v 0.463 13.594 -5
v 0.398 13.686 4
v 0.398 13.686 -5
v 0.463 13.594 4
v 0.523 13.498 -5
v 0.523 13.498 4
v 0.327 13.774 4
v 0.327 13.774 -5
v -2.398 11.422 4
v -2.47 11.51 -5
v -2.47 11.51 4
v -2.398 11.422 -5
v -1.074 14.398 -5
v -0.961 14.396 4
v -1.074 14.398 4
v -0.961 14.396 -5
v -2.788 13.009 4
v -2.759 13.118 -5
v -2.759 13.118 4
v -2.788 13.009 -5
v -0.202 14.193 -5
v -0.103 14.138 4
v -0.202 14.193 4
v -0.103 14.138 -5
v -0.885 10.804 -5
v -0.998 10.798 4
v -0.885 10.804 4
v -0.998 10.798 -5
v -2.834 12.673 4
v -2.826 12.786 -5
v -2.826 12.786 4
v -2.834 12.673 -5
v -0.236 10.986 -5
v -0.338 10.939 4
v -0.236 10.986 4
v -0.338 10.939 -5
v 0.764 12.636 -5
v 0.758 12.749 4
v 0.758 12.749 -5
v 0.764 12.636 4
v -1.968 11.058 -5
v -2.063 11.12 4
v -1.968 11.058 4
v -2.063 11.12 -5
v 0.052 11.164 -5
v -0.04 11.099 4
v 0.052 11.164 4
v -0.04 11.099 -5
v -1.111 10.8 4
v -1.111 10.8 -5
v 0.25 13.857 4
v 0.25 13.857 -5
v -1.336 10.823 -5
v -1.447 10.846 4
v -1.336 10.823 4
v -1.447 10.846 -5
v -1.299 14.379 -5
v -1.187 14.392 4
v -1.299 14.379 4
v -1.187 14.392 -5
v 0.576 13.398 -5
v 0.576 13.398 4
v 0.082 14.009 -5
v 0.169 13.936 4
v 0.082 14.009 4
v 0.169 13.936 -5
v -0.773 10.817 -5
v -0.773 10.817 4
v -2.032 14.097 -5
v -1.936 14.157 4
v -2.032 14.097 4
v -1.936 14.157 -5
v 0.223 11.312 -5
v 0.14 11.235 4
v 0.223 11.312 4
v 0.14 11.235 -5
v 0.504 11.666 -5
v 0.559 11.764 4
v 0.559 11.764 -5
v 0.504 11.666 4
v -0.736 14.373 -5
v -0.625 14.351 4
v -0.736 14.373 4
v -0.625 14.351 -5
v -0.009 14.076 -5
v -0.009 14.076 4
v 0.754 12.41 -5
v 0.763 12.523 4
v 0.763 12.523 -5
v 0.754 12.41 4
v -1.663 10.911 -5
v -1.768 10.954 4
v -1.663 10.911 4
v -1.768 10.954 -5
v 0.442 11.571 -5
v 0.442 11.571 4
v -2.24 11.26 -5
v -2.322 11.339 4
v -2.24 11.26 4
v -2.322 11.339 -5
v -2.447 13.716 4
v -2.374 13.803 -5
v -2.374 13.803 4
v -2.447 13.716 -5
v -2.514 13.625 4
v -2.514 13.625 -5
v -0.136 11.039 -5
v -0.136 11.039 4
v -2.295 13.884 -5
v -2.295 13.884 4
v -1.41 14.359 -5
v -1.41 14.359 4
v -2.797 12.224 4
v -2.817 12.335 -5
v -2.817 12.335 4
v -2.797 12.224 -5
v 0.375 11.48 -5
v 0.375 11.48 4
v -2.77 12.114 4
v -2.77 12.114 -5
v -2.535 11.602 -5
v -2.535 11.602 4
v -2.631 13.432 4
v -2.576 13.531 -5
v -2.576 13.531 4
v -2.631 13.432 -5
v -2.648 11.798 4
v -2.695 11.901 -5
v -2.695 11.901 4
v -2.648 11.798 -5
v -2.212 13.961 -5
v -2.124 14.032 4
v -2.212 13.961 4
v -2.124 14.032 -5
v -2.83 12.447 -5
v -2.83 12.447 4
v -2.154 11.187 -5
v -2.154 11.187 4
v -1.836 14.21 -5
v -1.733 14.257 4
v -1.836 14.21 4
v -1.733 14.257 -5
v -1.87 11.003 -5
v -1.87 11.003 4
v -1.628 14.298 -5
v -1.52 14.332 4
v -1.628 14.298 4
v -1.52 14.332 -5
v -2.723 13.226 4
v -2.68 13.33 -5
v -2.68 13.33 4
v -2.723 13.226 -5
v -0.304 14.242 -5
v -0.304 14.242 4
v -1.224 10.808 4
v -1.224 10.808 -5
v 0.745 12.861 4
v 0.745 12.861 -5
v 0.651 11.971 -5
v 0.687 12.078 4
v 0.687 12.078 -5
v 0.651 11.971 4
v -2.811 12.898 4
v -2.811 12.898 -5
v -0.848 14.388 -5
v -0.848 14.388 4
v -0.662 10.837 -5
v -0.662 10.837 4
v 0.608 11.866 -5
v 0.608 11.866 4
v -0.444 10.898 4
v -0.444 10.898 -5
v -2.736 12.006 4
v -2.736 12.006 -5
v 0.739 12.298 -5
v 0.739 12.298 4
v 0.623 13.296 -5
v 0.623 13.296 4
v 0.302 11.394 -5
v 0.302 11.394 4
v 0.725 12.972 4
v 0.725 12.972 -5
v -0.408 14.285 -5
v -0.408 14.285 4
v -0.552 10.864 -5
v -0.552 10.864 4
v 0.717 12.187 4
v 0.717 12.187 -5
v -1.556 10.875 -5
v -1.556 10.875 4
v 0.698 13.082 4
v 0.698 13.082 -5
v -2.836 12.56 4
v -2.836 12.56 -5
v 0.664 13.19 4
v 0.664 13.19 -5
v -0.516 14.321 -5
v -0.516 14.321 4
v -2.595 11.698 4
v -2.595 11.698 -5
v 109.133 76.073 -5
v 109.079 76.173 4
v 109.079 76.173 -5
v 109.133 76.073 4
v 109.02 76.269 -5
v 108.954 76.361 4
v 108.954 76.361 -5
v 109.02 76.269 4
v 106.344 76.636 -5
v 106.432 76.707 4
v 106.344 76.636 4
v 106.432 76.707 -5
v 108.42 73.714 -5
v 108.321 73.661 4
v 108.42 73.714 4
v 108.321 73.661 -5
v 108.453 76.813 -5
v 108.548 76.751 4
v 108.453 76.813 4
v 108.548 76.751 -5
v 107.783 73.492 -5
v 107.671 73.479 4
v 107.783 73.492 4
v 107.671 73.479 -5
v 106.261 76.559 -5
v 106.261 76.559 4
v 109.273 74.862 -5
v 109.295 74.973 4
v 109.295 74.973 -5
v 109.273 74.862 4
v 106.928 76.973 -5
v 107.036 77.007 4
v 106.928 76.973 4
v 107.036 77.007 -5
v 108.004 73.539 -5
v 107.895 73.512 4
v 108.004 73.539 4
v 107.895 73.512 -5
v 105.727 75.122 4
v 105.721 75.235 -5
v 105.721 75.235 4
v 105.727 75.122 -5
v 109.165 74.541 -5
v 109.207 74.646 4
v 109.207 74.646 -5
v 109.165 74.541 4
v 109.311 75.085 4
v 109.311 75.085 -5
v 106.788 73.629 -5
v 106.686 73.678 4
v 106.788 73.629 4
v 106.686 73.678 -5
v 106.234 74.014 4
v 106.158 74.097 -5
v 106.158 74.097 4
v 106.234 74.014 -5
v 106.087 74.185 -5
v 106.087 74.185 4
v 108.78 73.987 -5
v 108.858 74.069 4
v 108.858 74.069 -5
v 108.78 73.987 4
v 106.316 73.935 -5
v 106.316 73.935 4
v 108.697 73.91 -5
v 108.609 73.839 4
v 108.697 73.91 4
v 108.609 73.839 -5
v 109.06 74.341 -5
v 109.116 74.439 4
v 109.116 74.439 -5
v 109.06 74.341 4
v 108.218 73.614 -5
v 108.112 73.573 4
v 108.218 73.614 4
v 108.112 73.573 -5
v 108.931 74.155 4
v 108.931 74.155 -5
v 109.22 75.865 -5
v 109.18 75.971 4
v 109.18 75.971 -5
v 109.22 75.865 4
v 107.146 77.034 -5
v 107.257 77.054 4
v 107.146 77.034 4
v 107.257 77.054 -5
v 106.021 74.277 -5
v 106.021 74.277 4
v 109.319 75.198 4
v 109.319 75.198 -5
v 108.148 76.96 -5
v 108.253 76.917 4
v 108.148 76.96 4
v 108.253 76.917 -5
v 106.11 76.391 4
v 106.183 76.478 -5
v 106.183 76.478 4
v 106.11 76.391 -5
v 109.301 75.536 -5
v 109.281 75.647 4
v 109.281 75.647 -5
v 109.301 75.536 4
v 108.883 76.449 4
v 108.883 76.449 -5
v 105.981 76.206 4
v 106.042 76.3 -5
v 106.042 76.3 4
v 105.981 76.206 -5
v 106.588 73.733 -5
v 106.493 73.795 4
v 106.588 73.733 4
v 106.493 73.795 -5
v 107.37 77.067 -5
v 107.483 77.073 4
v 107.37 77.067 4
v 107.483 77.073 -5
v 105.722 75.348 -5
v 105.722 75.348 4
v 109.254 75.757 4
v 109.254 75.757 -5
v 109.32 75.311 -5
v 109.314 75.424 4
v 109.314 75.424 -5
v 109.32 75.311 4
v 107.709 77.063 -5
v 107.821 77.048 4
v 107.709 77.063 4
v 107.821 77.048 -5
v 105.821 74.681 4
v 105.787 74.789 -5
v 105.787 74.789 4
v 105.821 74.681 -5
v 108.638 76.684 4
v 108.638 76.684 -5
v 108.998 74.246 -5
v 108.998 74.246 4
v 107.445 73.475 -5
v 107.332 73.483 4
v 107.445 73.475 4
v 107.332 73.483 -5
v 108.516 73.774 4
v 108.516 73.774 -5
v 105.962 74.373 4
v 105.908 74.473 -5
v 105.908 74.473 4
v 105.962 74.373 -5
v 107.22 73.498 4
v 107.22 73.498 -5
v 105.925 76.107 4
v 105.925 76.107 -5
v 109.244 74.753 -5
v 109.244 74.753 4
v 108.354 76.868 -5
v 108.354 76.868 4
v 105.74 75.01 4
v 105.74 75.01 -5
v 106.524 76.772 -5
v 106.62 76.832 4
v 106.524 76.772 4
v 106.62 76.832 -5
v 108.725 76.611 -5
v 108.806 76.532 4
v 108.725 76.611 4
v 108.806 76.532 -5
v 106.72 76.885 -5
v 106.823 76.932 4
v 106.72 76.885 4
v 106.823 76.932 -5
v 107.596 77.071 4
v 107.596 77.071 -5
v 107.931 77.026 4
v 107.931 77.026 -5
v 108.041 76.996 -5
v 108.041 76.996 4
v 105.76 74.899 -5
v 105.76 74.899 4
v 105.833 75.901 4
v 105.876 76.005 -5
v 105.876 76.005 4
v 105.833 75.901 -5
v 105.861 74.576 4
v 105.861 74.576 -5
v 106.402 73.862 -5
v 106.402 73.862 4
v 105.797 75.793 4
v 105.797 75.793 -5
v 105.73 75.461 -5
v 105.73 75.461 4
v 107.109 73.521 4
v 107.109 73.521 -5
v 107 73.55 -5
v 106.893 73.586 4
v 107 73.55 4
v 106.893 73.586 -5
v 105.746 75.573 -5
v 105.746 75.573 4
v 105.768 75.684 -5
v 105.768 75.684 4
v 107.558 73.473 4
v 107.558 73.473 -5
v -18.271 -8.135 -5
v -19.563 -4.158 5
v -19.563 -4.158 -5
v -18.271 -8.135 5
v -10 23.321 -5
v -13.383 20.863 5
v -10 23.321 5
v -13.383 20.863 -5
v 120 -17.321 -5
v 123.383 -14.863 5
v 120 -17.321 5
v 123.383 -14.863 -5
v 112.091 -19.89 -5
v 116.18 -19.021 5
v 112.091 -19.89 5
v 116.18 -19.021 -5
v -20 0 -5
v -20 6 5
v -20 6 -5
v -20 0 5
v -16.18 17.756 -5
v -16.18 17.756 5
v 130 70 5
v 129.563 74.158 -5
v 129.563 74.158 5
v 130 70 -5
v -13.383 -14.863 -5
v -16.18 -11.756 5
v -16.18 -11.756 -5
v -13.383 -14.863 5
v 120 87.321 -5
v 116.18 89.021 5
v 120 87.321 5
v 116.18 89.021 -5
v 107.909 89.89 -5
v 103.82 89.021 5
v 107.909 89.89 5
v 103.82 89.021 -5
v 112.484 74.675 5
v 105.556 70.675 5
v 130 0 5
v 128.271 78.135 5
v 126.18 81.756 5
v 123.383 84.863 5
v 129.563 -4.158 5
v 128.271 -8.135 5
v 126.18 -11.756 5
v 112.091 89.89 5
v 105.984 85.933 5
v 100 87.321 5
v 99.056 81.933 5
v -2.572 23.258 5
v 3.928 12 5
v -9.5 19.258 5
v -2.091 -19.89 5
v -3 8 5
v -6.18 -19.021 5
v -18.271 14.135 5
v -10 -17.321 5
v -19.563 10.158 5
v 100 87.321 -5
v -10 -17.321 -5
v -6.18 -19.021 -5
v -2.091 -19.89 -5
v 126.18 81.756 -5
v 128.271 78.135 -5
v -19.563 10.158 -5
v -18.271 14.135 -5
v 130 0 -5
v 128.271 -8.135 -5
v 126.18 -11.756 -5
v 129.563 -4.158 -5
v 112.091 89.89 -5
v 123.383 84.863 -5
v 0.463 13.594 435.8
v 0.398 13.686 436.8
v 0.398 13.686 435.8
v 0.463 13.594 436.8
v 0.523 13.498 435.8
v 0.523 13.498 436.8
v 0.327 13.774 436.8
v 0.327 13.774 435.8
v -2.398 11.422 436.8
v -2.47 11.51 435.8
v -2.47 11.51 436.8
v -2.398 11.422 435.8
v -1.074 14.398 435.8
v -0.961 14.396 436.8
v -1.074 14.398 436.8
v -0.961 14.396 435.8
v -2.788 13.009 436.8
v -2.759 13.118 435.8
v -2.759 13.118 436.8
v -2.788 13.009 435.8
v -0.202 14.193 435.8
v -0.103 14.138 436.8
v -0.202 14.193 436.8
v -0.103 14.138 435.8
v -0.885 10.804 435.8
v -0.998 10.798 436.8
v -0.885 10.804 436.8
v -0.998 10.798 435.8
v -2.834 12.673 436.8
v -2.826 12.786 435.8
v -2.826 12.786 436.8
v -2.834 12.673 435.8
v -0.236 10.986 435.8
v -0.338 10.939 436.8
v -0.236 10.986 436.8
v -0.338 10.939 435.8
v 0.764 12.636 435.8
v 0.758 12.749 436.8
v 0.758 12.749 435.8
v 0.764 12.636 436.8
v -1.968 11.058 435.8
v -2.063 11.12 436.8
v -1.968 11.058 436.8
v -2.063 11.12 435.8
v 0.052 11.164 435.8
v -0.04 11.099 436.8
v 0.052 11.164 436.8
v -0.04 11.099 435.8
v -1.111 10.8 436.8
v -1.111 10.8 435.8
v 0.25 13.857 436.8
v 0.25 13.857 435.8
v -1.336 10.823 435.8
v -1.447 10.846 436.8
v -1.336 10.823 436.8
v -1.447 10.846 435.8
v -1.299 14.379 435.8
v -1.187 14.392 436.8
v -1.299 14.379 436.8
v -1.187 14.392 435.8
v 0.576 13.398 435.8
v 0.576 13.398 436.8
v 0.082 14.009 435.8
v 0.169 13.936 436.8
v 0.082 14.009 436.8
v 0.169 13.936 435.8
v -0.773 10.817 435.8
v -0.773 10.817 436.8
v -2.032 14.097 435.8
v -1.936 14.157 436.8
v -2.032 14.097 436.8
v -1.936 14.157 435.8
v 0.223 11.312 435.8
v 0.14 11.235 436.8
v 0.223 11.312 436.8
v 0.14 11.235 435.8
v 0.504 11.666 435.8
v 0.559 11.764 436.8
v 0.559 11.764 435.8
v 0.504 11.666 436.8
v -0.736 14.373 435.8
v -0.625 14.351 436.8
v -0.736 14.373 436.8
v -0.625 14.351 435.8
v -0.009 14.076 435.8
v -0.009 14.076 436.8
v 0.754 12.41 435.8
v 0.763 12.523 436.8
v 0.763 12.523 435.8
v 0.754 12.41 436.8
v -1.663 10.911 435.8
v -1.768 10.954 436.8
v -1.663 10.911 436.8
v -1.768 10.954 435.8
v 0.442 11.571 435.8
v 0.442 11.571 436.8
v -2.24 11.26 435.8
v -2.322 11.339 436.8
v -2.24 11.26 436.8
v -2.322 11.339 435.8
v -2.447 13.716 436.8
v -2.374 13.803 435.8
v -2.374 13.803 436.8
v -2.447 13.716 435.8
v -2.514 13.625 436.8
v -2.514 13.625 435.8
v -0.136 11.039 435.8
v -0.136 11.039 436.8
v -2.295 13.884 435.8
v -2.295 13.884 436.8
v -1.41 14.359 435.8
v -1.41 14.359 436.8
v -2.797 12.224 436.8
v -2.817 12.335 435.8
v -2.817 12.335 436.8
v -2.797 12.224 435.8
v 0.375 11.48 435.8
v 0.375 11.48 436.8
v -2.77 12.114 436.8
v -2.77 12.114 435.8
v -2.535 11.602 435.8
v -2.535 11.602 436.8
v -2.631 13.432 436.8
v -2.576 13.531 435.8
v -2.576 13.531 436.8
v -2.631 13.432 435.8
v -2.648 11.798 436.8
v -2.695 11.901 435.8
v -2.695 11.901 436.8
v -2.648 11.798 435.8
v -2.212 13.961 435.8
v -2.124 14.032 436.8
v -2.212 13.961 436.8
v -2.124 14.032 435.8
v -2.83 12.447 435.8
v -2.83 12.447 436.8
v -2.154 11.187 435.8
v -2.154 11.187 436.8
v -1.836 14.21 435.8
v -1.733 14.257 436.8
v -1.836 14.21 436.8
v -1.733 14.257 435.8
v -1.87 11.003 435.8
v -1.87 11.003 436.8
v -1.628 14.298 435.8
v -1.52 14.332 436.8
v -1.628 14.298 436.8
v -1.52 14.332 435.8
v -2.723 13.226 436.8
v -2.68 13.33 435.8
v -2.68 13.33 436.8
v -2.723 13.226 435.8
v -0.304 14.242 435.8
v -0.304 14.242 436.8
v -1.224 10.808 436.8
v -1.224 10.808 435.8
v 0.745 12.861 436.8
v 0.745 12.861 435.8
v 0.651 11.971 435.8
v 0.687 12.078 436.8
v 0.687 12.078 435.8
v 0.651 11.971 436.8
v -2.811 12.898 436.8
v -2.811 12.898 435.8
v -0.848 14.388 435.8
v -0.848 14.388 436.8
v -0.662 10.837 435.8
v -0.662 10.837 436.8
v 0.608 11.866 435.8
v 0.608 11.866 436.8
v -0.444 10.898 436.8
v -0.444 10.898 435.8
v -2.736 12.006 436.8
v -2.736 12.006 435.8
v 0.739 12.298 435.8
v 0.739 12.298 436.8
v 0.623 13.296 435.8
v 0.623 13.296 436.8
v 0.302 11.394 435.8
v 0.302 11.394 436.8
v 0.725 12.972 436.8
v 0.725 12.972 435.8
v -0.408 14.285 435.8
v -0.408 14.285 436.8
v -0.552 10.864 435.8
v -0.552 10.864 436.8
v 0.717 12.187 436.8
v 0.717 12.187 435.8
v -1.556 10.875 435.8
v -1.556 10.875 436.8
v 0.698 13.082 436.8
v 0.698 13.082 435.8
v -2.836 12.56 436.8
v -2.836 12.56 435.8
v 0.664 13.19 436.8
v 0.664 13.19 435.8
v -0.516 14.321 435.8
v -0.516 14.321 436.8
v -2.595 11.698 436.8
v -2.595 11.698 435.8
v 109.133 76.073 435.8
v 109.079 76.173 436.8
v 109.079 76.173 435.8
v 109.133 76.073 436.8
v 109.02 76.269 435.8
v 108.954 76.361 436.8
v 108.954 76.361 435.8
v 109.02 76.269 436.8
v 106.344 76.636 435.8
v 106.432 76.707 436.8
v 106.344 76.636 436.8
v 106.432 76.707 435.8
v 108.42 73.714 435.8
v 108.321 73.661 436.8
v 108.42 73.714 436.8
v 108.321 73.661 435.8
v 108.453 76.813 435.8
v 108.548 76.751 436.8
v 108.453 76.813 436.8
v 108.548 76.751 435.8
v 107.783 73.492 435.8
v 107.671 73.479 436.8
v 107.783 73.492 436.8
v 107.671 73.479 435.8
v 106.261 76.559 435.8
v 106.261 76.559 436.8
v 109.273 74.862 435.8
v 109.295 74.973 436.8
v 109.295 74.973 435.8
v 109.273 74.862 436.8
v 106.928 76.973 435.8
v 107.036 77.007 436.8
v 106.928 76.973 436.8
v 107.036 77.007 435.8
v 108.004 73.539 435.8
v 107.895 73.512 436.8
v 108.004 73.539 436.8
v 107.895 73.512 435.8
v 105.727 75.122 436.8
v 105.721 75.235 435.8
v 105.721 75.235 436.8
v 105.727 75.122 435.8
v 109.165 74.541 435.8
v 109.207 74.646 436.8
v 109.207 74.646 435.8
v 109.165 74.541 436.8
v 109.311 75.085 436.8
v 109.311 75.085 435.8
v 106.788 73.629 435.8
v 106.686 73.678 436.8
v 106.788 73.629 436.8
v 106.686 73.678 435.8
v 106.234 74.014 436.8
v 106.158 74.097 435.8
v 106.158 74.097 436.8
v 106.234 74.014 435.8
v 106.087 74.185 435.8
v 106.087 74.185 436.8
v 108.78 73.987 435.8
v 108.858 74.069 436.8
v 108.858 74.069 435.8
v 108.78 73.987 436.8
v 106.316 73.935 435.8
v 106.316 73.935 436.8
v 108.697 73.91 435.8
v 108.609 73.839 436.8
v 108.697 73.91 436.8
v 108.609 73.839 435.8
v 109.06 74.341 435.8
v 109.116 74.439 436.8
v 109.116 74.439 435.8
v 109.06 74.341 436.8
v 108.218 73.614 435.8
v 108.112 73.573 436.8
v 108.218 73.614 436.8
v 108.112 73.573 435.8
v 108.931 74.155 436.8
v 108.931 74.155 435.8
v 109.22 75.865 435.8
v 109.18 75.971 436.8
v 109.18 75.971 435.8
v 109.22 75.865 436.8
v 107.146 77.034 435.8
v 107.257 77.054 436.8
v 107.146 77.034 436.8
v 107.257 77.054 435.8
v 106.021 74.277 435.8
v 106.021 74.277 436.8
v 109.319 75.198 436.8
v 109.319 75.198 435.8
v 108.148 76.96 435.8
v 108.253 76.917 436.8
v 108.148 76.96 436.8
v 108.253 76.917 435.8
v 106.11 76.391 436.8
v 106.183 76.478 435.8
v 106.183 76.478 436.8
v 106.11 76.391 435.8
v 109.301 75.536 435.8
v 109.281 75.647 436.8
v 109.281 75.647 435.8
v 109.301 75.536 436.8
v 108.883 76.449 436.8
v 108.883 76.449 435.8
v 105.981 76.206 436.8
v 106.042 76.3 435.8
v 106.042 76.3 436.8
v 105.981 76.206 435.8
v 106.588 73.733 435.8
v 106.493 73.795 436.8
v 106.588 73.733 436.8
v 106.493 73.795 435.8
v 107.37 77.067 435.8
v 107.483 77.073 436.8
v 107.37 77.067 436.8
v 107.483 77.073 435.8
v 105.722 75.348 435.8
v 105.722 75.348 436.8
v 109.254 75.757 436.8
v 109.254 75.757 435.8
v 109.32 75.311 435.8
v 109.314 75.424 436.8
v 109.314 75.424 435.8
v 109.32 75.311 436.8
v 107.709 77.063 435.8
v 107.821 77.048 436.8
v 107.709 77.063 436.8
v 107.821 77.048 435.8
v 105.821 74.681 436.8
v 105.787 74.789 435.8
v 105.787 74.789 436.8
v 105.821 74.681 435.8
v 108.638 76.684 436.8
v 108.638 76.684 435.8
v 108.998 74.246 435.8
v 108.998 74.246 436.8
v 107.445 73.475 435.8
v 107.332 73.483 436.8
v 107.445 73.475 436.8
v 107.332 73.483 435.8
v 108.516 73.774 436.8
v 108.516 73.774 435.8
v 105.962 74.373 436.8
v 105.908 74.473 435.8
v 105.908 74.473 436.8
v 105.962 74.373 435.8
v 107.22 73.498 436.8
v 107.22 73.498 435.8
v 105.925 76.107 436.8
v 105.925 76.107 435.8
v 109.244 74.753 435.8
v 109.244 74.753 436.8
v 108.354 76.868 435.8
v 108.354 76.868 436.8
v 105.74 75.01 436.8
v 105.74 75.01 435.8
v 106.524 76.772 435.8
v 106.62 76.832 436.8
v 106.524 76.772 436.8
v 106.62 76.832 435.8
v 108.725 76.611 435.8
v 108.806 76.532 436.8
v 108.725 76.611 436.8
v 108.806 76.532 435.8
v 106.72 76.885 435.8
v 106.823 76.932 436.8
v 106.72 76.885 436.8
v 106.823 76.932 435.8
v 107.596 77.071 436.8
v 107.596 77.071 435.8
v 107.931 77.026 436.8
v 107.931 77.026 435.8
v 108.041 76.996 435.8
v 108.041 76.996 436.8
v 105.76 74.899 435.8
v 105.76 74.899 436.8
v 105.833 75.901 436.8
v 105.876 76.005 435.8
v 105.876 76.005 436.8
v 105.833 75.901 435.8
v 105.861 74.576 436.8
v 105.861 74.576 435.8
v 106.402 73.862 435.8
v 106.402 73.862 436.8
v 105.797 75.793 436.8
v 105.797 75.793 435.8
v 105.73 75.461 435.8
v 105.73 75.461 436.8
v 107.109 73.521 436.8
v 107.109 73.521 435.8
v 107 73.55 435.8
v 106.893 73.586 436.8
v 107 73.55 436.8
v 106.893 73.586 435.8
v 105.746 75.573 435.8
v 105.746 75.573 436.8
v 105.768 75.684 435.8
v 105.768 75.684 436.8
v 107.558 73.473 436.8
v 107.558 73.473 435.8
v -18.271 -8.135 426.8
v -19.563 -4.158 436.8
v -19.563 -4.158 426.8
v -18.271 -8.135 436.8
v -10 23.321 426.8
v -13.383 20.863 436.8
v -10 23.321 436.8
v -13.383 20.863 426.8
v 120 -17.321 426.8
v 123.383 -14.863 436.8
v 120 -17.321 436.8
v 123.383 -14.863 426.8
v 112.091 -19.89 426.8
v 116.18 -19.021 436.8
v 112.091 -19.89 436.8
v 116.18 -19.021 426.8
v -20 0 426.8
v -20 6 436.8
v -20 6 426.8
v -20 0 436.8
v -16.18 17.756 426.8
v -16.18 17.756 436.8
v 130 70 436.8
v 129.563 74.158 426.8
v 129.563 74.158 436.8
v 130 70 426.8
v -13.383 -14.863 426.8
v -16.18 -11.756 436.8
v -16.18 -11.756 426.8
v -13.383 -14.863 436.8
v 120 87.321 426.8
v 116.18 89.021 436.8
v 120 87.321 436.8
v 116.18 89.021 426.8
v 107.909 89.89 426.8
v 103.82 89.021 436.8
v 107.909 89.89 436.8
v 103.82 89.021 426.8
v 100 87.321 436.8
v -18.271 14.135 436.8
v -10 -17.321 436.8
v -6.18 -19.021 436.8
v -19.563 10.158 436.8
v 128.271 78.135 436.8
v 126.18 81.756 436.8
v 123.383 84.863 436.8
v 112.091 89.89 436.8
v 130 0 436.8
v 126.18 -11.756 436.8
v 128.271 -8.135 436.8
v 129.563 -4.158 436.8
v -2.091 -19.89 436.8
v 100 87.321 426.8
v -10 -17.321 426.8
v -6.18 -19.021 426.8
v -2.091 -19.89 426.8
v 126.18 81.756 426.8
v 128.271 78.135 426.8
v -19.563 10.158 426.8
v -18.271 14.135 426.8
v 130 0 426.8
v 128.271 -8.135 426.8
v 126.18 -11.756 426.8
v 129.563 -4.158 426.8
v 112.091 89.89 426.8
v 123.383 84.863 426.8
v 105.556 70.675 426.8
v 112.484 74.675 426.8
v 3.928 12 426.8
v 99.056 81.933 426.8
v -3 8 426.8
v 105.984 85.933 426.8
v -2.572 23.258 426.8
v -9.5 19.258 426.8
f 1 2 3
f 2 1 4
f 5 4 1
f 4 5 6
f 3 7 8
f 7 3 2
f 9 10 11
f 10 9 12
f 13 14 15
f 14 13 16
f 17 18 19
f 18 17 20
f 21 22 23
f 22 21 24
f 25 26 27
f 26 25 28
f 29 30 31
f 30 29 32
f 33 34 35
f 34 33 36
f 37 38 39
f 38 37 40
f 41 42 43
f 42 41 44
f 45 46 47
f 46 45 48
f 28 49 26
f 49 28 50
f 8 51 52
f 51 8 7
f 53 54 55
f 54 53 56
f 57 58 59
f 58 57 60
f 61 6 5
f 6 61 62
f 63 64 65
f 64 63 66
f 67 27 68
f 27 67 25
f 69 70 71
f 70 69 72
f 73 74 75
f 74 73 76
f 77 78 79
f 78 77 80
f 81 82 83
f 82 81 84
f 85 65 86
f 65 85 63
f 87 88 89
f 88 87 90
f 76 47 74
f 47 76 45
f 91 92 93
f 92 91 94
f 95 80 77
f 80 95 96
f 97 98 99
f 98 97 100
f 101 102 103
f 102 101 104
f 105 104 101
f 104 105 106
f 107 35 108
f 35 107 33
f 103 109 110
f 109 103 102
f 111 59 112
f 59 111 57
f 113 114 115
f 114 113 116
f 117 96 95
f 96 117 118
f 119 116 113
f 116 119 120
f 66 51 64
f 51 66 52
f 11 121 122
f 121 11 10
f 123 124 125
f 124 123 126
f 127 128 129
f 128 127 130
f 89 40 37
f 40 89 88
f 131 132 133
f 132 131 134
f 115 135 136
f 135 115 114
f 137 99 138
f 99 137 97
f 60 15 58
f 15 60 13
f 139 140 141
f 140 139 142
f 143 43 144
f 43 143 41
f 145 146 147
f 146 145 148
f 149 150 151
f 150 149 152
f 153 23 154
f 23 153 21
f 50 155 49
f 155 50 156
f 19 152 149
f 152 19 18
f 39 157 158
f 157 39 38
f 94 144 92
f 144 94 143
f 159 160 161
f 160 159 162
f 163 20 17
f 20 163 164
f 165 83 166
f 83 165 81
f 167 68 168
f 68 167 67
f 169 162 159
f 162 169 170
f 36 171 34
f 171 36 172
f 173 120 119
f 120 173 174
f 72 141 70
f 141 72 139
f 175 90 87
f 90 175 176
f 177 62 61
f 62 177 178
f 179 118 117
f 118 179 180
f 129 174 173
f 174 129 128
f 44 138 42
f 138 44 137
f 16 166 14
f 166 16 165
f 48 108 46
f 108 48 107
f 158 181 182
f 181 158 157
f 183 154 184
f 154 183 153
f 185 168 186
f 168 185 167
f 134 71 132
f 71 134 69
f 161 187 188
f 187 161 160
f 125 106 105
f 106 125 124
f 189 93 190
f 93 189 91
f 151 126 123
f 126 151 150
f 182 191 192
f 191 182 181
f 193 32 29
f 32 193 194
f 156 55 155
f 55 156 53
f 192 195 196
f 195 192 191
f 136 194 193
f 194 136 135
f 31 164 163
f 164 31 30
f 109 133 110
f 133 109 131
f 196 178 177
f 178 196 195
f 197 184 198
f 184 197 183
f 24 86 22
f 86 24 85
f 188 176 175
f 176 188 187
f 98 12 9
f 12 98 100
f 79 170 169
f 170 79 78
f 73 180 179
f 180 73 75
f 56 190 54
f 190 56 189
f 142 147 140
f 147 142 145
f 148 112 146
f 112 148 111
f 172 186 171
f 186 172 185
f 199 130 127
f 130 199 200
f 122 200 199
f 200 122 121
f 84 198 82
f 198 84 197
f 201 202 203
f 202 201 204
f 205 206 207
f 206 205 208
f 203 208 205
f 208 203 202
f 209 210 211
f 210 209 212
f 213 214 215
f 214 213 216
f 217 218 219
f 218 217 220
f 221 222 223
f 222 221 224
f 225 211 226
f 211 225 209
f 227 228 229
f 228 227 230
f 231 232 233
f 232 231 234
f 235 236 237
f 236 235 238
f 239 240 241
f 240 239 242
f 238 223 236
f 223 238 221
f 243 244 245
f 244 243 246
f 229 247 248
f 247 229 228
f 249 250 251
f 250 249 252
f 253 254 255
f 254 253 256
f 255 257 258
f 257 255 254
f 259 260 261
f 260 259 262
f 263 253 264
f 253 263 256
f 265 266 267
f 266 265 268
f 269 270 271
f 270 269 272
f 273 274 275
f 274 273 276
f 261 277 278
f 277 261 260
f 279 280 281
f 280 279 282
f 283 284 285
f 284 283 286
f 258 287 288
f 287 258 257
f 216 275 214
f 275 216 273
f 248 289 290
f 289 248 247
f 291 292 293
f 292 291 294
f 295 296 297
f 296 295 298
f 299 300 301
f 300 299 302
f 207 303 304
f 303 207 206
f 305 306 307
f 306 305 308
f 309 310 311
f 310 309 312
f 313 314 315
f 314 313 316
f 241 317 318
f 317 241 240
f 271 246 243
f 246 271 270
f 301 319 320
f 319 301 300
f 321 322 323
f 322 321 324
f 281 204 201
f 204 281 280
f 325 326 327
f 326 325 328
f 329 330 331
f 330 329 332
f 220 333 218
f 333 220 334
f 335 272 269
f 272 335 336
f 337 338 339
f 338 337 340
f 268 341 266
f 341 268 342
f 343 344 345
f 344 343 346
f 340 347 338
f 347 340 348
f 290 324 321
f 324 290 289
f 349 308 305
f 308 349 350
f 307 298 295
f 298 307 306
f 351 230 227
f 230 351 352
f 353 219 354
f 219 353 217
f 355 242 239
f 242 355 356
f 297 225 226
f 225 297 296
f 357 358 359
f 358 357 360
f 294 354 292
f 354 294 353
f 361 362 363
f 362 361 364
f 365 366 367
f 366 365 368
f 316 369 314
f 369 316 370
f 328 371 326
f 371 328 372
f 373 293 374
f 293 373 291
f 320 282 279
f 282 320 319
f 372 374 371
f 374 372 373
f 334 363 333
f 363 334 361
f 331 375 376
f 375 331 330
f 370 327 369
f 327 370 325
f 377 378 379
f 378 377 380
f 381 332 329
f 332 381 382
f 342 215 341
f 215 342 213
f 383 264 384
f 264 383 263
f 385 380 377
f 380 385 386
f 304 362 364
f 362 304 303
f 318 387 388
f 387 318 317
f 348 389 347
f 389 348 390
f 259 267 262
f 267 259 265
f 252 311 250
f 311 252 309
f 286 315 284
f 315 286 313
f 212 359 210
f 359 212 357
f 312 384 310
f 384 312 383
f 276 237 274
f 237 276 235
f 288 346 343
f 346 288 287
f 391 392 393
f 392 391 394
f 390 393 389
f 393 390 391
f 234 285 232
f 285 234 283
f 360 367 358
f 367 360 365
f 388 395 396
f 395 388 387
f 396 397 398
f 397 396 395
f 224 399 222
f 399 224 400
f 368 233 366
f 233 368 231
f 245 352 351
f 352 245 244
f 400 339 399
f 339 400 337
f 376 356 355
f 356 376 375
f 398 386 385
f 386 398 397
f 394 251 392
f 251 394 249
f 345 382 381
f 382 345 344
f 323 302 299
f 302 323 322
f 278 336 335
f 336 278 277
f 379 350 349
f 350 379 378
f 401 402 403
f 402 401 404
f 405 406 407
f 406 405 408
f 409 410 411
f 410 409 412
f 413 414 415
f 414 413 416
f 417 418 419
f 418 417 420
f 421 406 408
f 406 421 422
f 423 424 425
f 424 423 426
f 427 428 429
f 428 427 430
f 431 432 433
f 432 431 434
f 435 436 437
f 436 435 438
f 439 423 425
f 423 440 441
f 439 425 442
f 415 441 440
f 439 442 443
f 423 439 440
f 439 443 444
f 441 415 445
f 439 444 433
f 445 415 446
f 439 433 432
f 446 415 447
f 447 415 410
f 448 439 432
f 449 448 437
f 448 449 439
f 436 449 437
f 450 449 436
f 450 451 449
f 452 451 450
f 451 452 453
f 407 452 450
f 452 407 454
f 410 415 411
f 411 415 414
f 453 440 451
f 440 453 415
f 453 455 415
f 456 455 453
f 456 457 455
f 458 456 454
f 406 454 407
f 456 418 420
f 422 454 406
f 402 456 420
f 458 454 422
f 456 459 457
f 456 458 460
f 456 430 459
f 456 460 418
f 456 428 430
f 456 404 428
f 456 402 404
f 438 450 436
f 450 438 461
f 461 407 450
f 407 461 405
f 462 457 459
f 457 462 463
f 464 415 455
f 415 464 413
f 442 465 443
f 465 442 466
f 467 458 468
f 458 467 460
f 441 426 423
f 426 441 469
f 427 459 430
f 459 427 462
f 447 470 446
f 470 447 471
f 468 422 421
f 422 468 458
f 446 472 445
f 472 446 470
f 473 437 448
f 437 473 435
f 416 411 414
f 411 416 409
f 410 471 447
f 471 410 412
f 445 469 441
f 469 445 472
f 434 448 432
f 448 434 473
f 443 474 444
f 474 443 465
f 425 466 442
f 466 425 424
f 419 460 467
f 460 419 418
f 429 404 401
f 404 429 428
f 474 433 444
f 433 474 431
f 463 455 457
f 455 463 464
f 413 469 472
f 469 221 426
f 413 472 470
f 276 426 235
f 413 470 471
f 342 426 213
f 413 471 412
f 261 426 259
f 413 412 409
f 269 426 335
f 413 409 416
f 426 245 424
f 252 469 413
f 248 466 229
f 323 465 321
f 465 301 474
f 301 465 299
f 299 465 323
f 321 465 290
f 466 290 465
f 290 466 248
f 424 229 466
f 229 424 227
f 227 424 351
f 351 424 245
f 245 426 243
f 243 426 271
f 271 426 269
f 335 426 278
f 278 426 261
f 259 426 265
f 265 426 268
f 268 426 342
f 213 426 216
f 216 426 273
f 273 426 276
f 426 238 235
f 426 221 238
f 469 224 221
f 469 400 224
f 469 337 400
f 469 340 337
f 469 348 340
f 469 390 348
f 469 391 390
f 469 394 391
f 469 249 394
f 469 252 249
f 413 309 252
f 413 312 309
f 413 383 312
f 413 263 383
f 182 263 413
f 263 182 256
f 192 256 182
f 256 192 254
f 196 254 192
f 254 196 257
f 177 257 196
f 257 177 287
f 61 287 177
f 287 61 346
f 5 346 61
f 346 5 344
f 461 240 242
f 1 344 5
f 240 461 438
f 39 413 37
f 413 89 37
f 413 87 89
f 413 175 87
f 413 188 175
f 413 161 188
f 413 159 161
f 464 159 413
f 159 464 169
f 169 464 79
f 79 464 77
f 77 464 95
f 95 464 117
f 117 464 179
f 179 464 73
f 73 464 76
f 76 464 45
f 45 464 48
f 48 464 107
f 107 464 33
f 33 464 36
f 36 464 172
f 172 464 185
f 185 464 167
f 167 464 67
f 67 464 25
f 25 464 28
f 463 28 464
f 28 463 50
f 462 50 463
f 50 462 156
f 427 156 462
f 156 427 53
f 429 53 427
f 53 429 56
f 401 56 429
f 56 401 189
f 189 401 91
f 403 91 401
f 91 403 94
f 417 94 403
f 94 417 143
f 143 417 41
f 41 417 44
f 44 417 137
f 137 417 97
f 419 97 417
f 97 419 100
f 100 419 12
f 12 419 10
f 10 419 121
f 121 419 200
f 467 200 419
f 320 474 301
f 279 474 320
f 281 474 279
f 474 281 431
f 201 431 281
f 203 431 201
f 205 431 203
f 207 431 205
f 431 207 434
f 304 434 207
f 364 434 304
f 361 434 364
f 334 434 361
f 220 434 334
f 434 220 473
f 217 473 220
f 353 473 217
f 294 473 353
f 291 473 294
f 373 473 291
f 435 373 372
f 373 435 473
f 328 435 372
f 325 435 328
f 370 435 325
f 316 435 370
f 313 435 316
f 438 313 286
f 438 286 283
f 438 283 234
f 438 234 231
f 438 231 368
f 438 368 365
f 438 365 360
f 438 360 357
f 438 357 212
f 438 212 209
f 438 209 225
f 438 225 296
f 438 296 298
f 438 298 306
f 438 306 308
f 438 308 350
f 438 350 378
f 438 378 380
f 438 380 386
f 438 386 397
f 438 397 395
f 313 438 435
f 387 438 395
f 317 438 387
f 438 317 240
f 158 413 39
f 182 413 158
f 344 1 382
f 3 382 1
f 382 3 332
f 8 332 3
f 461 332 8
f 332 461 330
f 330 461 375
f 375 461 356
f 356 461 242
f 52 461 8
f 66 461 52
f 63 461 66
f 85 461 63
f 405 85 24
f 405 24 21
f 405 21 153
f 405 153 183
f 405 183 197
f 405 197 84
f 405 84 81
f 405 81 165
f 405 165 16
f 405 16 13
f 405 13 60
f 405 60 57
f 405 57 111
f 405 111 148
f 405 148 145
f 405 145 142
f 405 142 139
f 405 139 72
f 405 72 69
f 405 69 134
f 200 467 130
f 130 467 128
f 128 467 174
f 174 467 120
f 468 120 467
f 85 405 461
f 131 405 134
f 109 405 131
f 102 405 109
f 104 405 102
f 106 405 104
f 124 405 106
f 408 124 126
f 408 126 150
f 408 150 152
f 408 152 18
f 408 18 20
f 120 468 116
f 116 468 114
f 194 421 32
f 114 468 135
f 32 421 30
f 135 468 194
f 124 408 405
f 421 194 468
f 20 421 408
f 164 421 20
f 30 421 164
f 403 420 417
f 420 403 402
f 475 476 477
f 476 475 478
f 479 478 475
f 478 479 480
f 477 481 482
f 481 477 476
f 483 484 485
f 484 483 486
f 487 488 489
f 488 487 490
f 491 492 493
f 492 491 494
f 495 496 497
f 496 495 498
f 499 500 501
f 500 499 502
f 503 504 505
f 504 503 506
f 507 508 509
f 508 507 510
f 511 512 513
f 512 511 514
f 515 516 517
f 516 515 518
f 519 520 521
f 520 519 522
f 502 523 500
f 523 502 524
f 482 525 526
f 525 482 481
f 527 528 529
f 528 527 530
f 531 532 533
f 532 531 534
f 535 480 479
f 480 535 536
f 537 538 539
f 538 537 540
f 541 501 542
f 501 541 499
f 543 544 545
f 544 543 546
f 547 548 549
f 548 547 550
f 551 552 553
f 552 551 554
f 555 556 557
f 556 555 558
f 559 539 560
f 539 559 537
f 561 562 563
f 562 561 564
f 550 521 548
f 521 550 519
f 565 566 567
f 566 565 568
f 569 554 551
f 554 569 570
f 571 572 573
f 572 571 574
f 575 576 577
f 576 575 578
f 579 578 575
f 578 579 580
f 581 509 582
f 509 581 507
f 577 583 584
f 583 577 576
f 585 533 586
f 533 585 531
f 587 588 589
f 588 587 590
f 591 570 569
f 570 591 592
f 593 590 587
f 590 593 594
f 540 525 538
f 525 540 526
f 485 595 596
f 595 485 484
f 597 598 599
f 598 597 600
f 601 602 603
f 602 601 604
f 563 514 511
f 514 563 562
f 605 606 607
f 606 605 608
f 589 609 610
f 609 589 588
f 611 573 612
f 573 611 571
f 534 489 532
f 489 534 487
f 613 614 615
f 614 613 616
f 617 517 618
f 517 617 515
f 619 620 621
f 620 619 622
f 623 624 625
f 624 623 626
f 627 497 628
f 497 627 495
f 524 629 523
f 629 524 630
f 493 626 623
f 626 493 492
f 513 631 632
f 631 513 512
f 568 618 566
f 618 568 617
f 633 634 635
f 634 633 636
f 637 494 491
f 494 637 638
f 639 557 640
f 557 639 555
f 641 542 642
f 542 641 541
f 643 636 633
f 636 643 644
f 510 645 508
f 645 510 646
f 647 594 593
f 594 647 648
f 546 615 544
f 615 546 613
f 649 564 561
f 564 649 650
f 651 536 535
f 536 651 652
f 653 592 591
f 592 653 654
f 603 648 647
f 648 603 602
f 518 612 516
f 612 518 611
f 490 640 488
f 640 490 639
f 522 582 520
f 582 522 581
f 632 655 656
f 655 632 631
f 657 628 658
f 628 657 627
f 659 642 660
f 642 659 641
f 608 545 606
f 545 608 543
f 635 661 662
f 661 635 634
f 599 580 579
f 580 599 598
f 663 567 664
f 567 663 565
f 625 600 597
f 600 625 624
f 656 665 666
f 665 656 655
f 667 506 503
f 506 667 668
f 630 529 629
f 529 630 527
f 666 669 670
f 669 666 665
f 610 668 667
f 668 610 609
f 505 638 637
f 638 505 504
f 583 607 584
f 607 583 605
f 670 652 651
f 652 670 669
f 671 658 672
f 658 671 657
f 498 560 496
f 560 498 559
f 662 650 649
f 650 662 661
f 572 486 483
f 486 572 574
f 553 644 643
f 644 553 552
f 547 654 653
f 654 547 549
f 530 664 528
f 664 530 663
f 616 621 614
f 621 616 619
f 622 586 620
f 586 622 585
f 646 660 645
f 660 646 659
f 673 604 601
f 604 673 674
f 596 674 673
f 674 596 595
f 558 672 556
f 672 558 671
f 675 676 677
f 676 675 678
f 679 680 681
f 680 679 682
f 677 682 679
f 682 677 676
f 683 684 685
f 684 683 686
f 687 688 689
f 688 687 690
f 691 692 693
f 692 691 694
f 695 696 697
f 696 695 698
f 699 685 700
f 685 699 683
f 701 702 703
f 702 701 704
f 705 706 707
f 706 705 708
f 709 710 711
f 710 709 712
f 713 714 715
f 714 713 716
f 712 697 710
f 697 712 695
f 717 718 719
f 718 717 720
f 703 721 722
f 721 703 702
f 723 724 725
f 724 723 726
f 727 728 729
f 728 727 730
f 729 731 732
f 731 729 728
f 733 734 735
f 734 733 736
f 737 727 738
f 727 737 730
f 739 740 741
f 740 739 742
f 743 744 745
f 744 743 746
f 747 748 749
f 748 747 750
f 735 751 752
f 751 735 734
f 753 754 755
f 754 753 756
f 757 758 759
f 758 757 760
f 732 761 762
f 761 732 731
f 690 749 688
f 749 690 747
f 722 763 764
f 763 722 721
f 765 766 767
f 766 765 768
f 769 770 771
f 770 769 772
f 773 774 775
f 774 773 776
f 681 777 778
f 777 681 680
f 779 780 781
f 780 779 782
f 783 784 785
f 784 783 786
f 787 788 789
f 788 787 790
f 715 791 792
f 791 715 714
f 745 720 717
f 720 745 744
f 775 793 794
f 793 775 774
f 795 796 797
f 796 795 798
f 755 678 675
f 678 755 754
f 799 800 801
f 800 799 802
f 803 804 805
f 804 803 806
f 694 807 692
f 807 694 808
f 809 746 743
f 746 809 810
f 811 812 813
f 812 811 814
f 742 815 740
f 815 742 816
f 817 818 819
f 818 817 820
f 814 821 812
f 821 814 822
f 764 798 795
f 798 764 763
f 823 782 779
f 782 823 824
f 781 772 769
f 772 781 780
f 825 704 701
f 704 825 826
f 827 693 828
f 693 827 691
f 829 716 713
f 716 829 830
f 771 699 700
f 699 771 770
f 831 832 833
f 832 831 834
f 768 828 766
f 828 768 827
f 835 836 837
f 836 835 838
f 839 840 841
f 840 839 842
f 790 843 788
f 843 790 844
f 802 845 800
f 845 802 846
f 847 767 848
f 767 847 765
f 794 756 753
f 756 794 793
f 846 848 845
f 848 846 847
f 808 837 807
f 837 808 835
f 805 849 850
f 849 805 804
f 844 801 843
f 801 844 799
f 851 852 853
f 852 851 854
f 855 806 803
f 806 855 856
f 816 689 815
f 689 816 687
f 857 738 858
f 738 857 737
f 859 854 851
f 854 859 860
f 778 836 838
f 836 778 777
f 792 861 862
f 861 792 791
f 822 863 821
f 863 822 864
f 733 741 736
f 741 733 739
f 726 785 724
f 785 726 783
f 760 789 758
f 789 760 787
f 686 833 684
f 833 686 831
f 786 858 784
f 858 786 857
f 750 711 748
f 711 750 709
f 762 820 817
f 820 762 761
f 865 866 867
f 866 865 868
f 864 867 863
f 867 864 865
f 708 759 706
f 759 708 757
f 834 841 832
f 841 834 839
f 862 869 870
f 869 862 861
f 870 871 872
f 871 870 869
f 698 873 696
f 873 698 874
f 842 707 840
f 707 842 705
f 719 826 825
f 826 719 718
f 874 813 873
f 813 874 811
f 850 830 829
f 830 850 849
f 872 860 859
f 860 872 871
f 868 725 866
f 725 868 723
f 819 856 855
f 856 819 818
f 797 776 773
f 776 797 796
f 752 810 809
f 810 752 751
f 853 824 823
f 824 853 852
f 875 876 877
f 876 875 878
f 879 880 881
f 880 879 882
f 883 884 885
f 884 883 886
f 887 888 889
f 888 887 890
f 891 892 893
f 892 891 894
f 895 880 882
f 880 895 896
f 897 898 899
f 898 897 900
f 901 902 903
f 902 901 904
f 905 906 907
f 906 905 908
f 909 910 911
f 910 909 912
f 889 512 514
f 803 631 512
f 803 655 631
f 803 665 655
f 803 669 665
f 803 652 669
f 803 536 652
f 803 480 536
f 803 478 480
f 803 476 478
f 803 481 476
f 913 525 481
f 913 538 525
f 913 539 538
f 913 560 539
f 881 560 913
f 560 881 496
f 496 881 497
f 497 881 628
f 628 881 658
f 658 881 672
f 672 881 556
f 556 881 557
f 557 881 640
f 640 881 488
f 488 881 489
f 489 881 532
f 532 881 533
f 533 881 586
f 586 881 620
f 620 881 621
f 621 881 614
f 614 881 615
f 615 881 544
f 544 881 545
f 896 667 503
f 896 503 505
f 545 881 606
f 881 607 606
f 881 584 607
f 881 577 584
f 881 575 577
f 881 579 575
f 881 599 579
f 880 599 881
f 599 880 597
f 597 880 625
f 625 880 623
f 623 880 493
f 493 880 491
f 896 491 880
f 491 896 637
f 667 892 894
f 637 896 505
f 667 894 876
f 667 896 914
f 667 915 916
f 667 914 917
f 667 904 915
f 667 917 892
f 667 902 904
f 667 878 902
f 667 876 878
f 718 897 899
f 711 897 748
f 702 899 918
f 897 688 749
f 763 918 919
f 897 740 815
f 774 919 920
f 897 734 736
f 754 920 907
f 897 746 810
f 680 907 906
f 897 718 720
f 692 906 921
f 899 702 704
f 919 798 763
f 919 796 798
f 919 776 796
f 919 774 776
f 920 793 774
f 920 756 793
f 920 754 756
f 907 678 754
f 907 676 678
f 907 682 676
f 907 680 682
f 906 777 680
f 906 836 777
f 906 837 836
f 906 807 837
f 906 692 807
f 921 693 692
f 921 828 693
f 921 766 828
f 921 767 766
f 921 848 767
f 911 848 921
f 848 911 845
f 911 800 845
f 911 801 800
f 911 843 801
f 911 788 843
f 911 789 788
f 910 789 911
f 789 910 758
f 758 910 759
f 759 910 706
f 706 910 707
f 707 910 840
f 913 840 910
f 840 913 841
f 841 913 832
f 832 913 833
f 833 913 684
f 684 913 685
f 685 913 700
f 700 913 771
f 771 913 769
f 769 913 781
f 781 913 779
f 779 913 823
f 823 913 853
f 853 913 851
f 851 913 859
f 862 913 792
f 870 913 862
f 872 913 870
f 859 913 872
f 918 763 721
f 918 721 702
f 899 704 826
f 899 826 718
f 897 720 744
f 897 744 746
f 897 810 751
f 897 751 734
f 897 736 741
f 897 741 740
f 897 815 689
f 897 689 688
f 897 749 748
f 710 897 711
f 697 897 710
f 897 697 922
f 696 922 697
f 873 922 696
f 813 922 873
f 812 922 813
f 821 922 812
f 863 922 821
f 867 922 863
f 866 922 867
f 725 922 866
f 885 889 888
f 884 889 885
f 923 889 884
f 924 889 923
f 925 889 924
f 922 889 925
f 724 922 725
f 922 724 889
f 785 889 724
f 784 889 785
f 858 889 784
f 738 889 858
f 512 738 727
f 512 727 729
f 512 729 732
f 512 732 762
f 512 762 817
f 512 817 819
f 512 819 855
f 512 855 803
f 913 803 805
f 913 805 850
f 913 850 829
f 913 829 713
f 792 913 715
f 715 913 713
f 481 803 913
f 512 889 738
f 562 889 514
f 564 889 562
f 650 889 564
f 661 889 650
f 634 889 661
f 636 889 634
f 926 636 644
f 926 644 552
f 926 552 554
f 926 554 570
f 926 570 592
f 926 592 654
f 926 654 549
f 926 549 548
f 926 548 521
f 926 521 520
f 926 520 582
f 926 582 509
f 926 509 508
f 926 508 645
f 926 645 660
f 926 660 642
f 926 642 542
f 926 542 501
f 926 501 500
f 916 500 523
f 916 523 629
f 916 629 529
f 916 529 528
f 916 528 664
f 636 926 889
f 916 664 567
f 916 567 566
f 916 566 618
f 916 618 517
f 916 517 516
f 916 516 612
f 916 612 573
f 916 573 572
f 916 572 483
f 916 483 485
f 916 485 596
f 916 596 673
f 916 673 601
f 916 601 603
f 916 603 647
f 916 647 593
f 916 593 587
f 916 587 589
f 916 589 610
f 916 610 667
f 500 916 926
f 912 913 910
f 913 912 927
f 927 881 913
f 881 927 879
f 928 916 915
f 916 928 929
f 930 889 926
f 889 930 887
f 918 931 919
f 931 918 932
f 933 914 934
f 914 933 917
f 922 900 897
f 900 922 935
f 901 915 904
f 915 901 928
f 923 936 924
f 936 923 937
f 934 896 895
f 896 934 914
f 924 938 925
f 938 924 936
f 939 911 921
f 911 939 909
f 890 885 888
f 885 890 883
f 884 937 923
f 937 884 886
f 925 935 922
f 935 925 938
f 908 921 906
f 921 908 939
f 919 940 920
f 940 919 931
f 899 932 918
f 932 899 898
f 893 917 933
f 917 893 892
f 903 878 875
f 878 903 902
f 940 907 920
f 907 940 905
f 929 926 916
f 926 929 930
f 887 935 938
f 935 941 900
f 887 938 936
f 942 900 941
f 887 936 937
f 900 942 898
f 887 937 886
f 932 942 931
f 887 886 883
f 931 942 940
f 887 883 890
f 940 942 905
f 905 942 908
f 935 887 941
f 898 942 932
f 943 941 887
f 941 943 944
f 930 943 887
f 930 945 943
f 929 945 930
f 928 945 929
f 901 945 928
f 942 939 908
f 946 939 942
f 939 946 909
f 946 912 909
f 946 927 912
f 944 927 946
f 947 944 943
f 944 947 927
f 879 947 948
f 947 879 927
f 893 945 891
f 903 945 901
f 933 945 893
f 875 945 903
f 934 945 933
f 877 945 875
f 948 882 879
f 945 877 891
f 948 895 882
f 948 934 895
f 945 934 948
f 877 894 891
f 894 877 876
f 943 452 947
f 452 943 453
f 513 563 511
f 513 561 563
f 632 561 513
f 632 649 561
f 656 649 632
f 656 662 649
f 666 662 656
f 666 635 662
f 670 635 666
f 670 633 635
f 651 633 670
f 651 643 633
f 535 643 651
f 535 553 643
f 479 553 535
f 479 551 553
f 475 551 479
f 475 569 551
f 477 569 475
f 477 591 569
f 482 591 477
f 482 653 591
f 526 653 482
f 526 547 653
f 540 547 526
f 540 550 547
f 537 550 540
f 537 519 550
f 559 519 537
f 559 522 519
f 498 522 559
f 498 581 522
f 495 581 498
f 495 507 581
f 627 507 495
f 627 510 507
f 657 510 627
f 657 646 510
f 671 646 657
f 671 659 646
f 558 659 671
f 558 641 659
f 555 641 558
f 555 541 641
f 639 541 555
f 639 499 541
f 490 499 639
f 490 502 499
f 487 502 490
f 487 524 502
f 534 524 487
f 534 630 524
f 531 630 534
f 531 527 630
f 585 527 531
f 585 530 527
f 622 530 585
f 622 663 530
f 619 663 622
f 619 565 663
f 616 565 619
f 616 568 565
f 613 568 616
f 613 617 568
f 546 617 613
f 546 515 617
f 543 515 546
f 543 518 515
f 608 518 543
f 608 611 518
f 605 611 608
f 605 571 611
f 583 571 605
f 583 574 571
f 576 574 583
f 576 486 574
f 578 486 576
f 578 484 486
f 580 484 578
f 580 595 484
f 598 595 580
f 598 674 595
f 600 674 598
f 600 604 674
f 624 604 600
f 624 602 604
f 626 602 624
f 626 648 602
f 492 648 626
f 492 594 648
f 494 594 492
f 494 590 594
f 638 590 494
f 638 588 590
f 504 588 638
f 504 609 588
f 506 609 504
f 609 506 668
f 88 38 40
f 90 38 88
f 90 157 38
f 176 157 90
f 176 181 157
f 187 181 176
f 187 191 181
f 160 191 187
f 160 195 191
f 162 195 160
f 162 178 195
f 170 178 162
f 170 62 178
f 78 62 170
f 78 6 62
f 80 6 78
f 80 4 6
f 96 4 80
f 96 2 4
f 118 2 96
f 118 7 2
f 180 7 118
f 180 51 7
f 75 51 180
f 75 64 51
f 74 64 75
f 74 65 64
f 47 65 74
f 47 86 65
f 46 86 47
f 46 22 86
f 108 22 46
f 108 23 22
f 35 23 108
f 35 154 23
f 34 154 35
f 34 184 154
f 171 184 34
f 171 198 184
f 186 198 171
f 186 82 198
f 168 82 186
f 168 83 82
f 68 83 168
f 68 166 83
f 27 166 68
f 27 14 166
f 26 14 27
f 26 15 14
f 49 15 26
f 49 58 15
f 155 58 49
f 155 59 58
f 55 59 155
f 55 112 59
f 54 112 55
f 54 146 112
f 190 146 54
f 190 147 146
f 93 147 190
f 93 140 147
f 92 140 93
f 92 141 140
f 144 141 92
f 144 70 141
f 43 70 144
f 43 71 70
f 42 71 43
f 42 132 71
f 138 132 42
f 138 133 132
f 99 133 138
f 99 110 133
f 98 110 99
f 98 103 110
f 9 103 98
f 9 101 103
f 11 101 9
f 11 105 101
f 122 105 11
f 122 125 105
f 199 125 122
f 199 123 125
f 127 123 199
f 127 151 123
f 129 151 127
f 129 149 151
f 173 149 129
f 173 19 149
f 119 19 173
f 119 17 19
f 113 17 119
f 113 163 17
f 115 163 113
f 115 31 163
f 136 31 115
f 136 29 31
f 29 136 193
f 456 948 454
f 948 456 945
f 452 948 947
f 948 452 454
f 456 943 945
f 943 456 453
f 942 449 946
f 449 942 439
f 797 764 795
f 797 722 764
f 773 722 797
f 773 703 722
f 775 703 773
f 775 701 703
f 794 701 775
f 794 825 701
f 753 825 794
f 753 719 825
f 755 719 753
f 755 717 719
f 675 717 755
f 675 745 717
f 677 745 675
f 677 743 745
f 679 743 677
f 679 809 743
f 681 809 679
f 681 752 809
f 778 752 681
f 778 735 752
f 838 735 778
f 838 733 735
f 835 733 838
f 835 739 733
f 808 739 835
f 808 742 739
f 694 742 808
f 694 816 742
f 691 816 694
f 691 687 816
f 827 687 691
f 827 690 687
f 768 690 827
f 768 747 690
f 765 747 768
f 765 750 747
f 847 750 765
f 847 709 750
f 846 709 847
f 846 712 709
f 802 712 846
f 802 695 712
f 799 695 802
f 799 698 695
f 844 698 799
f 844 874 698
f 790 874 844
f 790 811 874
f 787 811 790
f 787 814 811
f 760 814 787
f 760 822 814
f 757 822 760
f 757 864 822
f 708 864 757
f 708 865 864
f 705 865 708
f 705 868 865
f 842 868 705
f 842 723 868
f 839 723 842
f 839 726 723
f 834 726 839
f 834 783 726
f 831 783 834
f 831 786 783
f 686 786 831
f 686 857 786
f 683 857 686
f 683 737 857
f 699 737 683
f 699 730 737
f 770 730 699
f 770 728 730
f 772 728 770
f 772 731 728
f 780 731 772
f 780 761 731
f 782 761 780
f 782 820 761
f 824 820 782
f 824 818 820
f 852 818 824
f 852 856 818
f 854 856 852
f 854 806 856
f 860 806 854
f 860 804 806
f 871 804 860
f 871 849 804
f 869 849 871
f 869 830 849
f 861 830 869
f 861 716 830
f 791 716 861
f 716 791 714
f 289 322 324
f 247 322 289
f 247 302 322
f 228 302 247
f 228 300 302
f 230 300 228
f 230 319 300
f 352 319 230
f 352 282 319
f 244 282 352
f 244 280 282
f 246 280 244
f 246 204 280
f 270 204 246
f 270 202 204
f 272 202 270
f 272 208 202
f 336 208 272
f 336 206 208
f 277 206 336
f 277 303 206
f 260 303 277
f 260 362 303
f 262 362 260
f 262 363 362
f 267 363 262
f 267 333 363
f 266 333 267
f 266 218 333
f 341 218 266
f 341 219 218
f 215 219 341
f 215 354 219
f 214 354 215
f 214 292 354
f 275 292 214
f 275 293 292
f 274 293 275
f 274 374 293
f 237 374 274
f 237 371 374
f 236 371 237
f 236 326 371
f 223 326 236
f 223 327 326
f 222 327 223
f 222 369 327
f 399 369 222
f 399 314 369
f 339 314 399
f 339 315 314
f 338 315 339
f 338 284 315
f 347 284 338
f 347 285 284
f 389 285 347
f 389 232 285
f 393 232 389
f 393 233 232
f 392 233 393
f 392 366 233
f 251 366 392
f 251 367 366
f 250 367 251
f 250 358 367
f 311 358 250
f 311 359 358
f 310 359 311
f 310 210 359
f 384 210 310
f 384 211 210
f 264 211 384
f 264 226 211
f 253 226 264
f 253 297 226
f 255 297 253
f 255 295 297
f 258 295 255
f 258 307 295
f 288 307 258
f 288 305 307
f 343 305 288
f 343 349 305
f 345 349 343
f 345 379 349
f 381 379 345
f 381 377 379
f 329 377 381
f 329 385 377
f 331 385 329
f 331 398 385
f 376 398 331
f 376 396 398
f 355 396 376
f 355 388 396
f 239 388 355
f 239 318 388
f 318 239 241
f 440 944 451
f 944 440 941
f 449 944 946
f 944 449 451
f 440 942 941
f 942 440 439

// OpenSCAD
ARMATURES=true;

HU=3;

HP_SIZE = 5.08;
HU_SIZE = 44.45;

HEIGHT_FRONT=6;
HEIGHT_BACK=70;
LENGTH=110;

module side() {
    difference() {
        hull() {
            translate([0,0,0]) cylinder(h = 10, r = 20, center = true);
            translate([LENGTH,0,0]) cylinder(h = 10, r = 20, center = true);
            translate([0,HEIGHT_FRONT,0]) cylinder(h = 10, r = 20, center = true);
            translate([LENGTH,HEIGHT_BACK,0]) cylinder(h = 10, r = 20, center = true);
        }
        translate([-3,0,4]) {
            translate([0,8,0]) rotate([0,0,30]) screw_holes();
        }
    }
}

module screw_holes() {
    translate([4,3,0]) cylinder(h=30,r=1.8,center=true,$fn=100);
//    translate([4,3,-27]) cylinder(h=40,r=3.5,center=true,$fn=100);
    translate([HU*HU_SIZE-8+4,3,0]) cylinder(h=30,r=1.8,center=true,$fn=100);
//    translate([HU*HU_SIZE-8+4,3,-27]) cylinder(h=40,r=3.5,center=true,$fn=100);

//    translate([4,3,431.80]) cylinder(h=30,r=1.6,center=true,$fn=100);
//    translate([HU*HU_SIZE-8+4,3,431.80]) cylinder(h=30,r=1.6,center=true,$fn=100);
}

module rails() {
    cube([8,13,431.80]);
    translate([HU*HU_SIZE-8,0,0]) cube([8,13,431.80]);
}


module draw() {
    side();
    translate([0,0,431.80]) side();

    translate([-3,0,4]) {
        translate([0,8,0]) rotate([0,0,30]) rails();
    }
}

draw();
//side();
